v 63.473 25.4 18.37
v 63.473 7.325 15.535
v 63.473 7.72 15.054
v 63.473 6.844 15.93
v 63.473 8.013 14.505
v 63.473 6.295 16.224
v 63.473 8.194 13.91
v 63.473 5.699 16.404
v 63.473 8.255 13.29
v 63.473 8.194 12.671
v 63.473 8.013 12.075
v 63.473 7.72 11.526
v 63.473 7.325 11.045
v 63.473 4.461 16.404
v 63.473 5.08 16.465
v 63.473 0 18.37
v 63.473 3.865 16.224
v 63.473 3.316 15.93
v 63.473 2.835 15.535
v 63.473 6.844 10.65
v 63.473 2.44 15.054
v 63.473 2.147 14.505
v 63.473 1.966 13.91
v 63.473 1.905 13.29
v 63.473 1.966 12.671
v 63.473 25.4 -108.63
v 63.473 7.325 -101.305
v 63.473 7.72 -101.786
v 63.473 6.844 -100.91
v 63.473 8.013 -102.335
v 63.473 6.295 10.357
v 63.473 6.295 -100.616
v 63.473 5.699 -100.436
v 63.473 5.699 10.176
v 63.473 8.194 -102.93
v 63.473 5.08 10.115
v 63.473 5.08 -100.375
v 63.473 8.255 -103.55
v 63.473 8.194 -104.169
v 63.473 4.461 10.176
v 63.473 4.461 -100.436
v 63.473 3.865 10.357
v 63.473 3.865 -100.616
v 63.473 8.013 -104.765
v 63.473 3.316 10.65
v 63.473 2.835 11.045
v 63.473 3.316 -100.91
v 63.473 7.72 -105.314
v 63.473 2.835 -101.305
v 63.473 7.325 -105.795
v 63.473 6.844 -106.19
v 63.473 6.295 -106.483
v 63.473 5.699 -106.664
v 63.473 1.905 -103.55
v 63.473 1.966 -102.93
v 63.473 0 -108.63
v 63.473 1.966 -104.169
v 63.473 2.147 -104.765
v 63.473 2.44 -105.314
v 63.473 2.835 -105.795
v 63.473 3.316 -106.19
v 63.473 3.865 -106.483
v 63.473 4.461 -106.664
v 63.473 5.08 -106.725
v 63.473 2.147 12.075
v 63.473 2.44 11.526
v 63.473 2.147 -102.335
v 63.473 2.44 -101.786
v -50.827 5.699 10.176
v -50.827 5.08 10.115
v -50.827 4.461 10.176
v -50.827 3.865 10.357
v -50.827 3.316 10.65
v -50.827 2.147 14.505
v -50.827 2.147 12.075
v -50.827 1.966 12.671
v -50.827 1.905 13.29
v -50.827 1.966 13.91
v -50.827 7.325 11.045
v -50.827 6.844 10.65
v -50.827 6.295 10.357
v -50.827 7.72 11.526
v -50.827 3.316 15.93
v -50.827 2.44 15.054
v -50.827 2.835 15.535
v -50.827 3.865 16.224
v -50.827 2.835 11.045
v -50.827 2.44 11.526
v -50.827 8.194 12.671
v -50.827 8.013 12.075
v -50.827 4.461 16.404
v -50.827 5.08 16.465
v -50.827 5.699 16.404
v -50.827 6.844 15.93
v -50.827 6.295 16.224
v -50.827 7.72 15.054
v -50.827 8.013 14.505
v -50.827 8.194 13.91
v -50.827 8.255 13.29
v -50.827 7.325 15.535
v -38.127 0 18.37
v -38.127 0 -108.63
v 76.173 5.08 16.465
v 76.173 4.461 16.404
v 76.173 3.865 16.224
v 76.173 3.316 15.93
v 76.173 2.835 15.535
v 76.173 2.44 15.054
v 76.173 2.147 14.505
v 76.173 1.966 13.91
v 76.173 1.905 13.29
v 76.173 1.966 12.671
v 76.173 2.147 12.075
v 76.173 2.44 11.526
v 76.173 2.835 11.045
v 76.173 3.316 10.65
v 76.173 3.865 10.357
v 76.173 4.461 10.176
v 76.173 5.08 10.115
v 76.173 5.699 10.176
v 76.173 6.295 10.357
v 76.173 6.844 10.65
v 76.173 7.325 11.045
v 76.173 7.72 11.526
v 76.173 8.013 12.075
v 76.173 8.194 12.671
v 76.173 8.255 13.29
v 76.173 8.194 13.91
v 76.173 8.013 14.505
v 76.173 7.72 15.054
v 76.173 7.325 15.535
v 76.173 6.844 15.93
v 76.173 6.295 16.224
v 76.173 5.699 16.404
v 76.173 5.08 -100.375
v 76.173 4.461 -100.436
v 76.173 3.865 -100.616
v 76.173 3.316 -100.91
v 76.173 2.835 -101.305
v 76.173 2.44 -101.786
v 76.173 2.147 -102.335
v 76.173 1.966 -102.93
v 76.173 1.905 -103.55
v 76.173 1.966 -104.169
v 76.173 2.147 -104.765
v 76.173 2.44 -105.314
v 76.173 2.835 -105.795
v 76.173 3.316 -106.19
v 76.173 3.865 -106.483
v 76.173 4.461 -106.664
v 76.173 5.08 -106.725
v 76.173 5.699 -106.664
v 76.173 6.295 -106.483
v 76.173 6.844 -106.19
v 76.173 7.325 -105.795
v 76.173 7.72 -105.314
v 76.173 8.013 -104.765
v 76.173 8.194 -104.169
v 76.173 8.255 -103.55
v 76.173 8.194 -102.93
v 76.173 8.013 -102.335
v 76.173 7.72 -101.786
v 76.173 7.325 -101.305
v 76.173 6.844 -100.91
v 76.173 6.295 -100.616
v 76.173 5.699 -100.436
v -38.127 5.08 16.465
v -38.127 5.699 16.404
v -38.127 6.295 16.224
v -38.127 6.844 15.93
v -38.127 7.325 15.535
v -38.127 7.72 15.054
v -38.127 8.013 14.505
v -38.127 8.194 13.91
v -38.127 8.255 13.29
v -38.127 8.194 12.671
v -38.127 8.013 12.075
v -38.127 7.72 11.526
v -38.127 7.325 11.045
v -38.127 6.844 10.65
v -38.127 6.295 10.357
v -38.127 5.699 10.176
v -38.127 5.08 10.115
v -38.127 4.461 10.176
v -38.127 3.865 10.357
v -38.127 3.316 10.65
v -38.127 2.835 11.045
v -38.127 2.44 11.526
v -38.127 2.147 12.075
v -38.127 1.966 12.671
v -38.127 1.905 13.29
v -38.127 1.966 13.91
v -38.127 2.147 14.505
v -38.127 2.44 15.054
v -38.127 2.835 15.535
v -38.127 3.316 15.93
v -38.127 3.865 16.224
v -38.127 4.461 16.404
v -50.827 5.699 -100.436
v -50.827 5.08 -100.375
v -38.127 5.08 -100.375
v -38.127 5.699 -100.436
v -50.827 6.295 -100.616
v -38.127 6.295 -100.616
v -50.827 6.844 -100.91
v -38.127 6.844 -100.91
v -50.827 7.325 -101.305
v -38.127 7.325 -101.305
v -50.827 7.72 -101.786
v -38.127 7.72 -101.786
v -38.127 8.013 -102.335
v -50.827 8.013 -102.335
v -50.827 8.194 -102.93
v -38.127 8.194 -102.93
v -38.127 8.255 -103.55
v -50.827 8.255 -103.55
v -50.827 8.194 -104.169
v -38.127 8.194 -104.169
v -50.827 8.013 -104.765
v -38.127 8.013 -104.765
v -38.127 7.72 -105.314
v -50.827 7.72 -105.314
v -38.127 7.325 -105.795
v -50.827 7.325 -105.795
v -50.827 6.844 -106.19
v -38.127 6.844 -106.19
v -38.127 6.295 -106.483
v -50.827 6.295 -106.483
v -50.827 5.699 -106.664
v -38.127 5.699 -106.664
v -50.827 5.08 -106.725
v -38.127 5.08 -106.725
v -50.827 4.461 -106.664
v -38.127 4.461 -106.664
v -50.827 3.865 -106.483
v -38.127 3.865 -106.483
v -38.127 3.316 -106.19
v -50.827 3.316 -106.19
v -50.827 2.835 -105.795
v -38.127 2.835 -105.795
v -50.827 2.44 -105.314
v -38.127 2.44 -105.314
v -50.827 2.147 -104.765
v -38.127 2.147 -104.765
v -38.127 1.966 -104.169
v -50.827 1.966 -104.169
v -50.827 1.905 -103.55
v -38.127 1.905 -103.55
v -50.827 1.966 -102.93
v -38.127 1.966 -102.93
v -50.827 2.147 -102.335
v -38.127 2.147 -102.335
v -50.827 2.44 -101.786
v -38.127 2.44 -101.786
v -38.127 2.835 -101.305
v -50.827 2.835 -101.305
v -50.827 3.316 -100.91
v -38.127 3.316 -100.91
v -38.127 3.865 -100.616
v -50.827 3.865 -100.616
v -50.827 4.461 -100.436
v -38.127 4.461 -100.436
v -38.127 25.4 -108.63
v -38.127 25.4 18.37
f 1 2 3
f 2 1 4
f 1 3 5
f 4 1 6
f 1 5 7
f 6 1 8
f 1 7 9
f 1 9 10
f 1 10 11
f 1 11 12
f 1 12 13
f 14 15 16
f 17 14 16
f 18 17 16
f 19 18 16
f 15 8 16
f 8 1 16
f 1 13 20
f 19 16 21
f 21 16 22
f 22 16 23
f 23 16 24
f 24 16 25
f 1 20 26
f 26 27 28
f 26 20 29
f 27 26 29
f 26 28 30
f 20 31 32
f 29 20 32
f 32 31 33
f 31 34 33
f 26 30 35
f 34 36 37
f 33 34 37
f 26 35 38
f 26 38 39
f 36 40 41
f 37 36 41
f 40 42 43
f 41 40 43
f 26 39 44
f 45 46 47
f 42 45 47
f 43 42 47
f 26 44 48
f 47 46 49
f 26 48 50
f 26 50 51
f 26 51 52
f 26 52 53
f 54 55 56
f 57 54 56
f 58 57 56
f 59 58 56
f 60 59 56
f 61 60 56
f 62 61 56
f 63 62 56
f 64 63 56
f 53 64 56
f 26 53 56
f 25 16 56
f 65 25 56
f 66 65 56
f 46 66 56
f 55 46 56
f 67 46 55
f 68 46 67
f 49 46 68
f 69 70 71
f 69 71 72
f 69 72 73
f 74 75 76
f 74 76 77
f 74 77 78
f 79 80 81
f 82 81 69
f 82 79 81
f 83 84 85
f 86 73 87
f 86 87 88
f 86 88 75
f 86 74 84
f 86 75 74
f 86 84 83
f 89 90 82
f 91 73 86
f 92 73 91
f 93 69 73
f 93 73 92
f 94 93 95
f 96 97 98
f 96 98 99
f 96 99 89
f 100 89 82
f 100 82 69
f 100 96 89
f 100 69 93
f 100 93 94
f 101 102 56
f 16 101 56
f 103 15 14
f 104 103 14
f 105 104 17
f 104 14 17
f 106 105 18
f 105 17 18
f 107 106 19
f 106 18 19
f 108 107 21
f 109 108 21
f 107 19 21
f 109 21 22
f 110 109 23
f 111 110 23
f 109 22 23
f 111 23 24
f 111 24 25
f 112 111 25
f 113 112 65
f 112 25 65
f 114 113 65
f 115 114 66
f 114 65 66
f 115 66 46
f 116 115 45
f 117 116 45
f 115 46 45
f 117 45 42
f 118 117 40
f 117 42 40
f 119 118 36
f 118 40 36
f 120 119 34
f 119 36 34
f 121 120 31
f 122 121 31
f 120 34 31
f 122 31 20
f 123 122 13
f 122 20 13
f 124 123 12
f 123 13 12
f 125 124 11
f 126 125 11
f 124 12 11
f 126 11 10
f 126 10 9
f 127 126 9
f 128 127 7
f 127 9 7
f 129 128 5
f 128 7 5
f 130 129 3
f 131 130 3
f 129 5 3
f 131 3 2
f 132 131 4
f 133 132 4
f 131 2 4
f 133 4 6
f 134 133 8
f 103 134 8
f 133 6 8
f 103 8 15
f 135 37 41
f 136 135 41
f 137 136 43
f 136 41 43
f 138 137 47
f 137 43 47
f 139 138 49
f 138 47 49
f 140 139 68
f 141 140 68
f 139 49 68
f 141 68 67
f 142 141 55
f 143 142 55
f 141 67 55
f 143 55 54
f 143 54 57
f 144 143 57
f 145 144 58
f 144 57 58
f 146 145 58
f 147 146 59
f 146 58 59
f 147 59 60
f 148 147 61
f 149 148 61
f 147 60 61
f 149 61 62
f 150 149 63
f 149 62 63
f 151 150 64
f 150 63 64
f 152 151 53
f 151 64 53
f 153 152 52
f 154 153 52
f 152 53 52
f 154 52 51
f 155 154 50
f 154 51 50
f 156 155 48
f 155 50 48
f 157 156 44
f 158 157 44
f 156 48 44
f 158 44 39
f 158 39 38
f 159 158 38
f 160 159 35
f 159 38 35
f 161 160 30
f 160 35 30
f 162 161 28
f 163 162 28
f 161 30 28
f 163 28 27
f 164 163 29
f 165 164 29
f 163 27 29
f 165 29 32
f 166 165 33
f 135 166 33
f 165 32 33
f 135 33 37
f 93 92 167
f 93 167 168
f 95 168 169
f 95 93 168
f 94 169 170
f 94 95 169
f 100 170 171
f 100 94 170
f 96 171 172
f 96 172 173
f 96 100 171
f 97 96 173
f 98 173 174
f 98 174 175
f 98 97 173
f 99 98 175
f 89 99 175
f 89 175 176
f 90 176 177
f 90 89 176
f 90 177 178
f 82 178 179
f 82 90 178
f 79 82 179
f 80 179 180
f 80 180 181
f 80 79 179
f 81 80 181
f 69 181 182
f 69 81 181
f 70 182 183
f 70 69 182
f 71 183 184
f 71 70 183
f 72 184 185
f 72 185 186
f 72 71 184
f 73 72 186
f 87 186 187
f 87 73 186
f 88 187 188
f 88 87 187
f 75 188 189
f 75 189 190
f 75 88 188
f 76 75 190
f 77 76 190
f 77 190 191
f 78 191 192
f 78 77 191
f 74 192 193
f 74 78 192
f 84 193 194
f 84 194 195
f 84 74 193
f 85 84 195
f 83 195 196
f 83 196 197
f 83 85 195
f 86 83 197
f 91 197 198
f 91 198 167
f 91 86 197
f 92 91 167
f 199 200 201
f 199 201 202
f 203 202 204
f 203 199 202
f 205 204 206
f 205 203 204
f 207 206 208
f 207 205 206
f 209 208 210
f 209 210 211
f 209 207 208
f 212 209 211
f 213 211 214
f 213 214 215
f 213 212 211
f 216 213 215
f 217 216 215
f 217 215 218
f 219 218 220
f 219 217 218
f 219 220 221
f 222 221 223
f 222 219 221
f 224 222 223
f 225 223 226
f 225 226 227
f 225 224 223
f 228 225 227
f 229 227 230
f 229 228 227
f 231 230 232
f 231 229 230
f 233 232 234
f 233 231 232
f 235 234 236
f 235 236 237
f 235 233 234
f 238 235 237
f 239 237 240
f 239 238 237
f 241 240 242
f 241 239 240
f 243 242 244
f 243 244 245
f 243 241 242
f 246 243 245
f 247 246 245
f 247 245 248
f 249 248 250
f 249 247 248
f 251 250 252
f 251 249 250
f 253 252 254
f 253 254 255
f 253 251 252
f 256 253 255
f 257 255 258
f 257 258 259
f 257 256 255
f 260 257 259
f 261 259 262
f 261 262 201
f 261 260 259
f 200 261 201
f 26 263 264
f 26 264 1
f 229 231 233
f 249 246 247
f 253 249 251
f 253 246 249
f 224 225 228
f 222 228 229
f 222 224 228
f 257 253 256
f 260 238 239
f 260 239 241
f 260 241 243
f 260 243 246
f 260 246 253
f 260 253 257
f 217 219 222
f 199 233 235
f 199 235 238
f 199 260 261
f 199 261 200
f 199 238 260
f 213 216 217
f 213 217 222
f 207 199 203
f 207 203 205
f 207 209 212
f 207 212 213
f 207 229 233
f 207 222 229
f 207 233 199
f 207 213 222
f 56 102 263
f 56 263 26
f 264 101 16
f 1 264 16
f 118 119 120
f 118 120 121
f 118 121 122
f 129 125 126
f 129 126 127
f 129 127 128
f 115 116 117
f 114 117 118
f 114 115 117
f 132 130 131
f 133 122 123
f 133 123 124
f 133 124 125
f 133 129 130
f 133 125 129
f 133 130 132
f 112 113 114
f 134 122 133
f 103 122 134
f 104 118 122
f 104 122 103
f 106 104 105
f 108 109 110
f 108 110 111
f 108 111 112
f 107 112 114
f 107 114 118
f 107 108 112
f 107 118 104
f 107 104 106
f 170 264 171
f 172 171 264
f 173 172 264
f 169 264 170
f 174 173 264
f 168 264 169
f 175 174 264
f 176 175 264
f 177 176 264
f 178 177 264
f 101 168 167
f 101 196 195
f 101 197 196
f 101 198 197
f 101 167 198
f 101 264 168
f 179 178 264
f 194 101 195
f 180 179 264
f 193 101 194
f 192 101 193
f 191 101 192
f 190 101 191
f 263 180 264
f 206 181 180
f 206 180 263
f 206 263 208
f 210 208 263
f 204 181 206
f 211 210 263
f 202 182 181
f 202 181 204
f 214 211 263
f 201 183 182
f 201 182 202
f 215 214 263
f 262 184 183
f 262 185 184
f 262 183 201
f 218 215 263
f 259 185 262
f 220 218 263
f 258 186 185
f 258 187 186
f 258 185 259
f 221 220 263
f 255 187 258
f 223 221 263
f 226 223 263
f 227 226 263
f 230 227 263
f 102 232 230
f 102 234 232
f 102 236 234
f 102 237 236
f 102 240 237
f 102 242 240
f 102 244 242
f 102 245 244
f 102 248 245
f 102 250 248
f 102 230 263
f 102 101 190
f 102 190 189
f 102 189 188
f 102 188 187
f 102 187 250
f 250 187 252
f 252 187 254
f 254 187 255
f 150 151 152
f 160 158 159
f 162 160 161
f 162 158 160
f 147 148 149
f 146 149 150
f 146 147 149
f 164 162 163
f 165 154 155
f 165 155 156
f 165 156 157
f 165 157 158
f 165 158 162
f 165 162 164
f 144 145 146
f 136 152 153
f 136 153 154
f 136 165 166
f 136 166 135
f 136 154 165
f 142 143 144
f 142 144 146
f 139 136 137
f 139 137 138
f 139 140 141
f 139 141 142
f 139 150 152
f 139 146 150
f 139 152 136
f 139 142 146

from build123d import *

# Parameters (mm, degrees)
SKETCH1_W           = 101.6
SKETCH1_H           = 127
BOSS_EXTRUDE1_DEPTH = 25.4
SKETCH2_R           = 3.175
BOSS_EXTRUDE3_DEPTH = 12.7
SKETCH3_R           = 3.175
BOSS_EXTRUDE4_DEPTH = 12.7
BOSS_EXTRUDE6_START = 12.7
SKETCH4_R           = 3.175
BOSS_EXTRUDE6_DEPTH = 12.7
BOSS_EXTRUDE7_START = 12.7
SKETCH5_R           = 3.175
BOSS_EXTRUDE7_DEPTH = 12.7


with BuildPart() as part:
    # Sketch1 → Boss-Extrude1 (new body)
    with BuildSketch(Plane(origin=(0, 0, 0), x_dir=(1, 0, 0), z_dir=(0, 1, 0))):
        with Locations((12.672921109, 45.129680171)):
            Rectangle(SKETCH1_W, SKETCH1_H)
    extrude(amount=BOSS_EXTRUDE1_DEPTH)

    # Sketch2 → Boss-Extrude3 (add)
    with BuildSketch(Plane(origin=(63.472921109, 0, 0), x_dir=(0, 0, -1), z_dir=(1, 0, 0))):
        with Locations(Location((-13.290319829, 5.08, 0), (0, 0, 180))):
            Circle(SKETCH2_R)
    extrude(amount=BOSS_EXTRUDE3_DEPTH)

    # Sketch3 → Boss-Extrude4 (add)
    with BuildSketch(Plane(origin=(63.472921109, 0, 0), x_dir=(0, 0, -1), z_dir=(1, 0, 0))):
        with Locations(Location((103.549680171, 5.08, 0), (0, 0, 180))):
            Circle(SKETCH3_R)
    extrude(amount=BOSS_EXTRUDE4_DEPTH)

    # Sketch4 → Boss-Extrude6 (add)
    with BuildSketch(Plane.ZY.offset(38.127078891).offset(BOSS_EXTRUDE6_START)):
        with Locations((-103.549680171, 5.08)):
            Circle(SKETCH4_R)
    extrude(amount=-BOSS_EXTRUDE6_DEPTH)

    # Sketch5 → Boss-Extrude7 (add)
    with BuildSketch(Plane.ZY.offset(38.127078891).offset(BOSS_EXTRUDE7_START)):
        with Locations((13.290319829, 5.08)):
            Circle(SKETCH5_R)
    extrude(amount=-BOSS_EXTRUDE7_DEPTH)


solid = part.part
